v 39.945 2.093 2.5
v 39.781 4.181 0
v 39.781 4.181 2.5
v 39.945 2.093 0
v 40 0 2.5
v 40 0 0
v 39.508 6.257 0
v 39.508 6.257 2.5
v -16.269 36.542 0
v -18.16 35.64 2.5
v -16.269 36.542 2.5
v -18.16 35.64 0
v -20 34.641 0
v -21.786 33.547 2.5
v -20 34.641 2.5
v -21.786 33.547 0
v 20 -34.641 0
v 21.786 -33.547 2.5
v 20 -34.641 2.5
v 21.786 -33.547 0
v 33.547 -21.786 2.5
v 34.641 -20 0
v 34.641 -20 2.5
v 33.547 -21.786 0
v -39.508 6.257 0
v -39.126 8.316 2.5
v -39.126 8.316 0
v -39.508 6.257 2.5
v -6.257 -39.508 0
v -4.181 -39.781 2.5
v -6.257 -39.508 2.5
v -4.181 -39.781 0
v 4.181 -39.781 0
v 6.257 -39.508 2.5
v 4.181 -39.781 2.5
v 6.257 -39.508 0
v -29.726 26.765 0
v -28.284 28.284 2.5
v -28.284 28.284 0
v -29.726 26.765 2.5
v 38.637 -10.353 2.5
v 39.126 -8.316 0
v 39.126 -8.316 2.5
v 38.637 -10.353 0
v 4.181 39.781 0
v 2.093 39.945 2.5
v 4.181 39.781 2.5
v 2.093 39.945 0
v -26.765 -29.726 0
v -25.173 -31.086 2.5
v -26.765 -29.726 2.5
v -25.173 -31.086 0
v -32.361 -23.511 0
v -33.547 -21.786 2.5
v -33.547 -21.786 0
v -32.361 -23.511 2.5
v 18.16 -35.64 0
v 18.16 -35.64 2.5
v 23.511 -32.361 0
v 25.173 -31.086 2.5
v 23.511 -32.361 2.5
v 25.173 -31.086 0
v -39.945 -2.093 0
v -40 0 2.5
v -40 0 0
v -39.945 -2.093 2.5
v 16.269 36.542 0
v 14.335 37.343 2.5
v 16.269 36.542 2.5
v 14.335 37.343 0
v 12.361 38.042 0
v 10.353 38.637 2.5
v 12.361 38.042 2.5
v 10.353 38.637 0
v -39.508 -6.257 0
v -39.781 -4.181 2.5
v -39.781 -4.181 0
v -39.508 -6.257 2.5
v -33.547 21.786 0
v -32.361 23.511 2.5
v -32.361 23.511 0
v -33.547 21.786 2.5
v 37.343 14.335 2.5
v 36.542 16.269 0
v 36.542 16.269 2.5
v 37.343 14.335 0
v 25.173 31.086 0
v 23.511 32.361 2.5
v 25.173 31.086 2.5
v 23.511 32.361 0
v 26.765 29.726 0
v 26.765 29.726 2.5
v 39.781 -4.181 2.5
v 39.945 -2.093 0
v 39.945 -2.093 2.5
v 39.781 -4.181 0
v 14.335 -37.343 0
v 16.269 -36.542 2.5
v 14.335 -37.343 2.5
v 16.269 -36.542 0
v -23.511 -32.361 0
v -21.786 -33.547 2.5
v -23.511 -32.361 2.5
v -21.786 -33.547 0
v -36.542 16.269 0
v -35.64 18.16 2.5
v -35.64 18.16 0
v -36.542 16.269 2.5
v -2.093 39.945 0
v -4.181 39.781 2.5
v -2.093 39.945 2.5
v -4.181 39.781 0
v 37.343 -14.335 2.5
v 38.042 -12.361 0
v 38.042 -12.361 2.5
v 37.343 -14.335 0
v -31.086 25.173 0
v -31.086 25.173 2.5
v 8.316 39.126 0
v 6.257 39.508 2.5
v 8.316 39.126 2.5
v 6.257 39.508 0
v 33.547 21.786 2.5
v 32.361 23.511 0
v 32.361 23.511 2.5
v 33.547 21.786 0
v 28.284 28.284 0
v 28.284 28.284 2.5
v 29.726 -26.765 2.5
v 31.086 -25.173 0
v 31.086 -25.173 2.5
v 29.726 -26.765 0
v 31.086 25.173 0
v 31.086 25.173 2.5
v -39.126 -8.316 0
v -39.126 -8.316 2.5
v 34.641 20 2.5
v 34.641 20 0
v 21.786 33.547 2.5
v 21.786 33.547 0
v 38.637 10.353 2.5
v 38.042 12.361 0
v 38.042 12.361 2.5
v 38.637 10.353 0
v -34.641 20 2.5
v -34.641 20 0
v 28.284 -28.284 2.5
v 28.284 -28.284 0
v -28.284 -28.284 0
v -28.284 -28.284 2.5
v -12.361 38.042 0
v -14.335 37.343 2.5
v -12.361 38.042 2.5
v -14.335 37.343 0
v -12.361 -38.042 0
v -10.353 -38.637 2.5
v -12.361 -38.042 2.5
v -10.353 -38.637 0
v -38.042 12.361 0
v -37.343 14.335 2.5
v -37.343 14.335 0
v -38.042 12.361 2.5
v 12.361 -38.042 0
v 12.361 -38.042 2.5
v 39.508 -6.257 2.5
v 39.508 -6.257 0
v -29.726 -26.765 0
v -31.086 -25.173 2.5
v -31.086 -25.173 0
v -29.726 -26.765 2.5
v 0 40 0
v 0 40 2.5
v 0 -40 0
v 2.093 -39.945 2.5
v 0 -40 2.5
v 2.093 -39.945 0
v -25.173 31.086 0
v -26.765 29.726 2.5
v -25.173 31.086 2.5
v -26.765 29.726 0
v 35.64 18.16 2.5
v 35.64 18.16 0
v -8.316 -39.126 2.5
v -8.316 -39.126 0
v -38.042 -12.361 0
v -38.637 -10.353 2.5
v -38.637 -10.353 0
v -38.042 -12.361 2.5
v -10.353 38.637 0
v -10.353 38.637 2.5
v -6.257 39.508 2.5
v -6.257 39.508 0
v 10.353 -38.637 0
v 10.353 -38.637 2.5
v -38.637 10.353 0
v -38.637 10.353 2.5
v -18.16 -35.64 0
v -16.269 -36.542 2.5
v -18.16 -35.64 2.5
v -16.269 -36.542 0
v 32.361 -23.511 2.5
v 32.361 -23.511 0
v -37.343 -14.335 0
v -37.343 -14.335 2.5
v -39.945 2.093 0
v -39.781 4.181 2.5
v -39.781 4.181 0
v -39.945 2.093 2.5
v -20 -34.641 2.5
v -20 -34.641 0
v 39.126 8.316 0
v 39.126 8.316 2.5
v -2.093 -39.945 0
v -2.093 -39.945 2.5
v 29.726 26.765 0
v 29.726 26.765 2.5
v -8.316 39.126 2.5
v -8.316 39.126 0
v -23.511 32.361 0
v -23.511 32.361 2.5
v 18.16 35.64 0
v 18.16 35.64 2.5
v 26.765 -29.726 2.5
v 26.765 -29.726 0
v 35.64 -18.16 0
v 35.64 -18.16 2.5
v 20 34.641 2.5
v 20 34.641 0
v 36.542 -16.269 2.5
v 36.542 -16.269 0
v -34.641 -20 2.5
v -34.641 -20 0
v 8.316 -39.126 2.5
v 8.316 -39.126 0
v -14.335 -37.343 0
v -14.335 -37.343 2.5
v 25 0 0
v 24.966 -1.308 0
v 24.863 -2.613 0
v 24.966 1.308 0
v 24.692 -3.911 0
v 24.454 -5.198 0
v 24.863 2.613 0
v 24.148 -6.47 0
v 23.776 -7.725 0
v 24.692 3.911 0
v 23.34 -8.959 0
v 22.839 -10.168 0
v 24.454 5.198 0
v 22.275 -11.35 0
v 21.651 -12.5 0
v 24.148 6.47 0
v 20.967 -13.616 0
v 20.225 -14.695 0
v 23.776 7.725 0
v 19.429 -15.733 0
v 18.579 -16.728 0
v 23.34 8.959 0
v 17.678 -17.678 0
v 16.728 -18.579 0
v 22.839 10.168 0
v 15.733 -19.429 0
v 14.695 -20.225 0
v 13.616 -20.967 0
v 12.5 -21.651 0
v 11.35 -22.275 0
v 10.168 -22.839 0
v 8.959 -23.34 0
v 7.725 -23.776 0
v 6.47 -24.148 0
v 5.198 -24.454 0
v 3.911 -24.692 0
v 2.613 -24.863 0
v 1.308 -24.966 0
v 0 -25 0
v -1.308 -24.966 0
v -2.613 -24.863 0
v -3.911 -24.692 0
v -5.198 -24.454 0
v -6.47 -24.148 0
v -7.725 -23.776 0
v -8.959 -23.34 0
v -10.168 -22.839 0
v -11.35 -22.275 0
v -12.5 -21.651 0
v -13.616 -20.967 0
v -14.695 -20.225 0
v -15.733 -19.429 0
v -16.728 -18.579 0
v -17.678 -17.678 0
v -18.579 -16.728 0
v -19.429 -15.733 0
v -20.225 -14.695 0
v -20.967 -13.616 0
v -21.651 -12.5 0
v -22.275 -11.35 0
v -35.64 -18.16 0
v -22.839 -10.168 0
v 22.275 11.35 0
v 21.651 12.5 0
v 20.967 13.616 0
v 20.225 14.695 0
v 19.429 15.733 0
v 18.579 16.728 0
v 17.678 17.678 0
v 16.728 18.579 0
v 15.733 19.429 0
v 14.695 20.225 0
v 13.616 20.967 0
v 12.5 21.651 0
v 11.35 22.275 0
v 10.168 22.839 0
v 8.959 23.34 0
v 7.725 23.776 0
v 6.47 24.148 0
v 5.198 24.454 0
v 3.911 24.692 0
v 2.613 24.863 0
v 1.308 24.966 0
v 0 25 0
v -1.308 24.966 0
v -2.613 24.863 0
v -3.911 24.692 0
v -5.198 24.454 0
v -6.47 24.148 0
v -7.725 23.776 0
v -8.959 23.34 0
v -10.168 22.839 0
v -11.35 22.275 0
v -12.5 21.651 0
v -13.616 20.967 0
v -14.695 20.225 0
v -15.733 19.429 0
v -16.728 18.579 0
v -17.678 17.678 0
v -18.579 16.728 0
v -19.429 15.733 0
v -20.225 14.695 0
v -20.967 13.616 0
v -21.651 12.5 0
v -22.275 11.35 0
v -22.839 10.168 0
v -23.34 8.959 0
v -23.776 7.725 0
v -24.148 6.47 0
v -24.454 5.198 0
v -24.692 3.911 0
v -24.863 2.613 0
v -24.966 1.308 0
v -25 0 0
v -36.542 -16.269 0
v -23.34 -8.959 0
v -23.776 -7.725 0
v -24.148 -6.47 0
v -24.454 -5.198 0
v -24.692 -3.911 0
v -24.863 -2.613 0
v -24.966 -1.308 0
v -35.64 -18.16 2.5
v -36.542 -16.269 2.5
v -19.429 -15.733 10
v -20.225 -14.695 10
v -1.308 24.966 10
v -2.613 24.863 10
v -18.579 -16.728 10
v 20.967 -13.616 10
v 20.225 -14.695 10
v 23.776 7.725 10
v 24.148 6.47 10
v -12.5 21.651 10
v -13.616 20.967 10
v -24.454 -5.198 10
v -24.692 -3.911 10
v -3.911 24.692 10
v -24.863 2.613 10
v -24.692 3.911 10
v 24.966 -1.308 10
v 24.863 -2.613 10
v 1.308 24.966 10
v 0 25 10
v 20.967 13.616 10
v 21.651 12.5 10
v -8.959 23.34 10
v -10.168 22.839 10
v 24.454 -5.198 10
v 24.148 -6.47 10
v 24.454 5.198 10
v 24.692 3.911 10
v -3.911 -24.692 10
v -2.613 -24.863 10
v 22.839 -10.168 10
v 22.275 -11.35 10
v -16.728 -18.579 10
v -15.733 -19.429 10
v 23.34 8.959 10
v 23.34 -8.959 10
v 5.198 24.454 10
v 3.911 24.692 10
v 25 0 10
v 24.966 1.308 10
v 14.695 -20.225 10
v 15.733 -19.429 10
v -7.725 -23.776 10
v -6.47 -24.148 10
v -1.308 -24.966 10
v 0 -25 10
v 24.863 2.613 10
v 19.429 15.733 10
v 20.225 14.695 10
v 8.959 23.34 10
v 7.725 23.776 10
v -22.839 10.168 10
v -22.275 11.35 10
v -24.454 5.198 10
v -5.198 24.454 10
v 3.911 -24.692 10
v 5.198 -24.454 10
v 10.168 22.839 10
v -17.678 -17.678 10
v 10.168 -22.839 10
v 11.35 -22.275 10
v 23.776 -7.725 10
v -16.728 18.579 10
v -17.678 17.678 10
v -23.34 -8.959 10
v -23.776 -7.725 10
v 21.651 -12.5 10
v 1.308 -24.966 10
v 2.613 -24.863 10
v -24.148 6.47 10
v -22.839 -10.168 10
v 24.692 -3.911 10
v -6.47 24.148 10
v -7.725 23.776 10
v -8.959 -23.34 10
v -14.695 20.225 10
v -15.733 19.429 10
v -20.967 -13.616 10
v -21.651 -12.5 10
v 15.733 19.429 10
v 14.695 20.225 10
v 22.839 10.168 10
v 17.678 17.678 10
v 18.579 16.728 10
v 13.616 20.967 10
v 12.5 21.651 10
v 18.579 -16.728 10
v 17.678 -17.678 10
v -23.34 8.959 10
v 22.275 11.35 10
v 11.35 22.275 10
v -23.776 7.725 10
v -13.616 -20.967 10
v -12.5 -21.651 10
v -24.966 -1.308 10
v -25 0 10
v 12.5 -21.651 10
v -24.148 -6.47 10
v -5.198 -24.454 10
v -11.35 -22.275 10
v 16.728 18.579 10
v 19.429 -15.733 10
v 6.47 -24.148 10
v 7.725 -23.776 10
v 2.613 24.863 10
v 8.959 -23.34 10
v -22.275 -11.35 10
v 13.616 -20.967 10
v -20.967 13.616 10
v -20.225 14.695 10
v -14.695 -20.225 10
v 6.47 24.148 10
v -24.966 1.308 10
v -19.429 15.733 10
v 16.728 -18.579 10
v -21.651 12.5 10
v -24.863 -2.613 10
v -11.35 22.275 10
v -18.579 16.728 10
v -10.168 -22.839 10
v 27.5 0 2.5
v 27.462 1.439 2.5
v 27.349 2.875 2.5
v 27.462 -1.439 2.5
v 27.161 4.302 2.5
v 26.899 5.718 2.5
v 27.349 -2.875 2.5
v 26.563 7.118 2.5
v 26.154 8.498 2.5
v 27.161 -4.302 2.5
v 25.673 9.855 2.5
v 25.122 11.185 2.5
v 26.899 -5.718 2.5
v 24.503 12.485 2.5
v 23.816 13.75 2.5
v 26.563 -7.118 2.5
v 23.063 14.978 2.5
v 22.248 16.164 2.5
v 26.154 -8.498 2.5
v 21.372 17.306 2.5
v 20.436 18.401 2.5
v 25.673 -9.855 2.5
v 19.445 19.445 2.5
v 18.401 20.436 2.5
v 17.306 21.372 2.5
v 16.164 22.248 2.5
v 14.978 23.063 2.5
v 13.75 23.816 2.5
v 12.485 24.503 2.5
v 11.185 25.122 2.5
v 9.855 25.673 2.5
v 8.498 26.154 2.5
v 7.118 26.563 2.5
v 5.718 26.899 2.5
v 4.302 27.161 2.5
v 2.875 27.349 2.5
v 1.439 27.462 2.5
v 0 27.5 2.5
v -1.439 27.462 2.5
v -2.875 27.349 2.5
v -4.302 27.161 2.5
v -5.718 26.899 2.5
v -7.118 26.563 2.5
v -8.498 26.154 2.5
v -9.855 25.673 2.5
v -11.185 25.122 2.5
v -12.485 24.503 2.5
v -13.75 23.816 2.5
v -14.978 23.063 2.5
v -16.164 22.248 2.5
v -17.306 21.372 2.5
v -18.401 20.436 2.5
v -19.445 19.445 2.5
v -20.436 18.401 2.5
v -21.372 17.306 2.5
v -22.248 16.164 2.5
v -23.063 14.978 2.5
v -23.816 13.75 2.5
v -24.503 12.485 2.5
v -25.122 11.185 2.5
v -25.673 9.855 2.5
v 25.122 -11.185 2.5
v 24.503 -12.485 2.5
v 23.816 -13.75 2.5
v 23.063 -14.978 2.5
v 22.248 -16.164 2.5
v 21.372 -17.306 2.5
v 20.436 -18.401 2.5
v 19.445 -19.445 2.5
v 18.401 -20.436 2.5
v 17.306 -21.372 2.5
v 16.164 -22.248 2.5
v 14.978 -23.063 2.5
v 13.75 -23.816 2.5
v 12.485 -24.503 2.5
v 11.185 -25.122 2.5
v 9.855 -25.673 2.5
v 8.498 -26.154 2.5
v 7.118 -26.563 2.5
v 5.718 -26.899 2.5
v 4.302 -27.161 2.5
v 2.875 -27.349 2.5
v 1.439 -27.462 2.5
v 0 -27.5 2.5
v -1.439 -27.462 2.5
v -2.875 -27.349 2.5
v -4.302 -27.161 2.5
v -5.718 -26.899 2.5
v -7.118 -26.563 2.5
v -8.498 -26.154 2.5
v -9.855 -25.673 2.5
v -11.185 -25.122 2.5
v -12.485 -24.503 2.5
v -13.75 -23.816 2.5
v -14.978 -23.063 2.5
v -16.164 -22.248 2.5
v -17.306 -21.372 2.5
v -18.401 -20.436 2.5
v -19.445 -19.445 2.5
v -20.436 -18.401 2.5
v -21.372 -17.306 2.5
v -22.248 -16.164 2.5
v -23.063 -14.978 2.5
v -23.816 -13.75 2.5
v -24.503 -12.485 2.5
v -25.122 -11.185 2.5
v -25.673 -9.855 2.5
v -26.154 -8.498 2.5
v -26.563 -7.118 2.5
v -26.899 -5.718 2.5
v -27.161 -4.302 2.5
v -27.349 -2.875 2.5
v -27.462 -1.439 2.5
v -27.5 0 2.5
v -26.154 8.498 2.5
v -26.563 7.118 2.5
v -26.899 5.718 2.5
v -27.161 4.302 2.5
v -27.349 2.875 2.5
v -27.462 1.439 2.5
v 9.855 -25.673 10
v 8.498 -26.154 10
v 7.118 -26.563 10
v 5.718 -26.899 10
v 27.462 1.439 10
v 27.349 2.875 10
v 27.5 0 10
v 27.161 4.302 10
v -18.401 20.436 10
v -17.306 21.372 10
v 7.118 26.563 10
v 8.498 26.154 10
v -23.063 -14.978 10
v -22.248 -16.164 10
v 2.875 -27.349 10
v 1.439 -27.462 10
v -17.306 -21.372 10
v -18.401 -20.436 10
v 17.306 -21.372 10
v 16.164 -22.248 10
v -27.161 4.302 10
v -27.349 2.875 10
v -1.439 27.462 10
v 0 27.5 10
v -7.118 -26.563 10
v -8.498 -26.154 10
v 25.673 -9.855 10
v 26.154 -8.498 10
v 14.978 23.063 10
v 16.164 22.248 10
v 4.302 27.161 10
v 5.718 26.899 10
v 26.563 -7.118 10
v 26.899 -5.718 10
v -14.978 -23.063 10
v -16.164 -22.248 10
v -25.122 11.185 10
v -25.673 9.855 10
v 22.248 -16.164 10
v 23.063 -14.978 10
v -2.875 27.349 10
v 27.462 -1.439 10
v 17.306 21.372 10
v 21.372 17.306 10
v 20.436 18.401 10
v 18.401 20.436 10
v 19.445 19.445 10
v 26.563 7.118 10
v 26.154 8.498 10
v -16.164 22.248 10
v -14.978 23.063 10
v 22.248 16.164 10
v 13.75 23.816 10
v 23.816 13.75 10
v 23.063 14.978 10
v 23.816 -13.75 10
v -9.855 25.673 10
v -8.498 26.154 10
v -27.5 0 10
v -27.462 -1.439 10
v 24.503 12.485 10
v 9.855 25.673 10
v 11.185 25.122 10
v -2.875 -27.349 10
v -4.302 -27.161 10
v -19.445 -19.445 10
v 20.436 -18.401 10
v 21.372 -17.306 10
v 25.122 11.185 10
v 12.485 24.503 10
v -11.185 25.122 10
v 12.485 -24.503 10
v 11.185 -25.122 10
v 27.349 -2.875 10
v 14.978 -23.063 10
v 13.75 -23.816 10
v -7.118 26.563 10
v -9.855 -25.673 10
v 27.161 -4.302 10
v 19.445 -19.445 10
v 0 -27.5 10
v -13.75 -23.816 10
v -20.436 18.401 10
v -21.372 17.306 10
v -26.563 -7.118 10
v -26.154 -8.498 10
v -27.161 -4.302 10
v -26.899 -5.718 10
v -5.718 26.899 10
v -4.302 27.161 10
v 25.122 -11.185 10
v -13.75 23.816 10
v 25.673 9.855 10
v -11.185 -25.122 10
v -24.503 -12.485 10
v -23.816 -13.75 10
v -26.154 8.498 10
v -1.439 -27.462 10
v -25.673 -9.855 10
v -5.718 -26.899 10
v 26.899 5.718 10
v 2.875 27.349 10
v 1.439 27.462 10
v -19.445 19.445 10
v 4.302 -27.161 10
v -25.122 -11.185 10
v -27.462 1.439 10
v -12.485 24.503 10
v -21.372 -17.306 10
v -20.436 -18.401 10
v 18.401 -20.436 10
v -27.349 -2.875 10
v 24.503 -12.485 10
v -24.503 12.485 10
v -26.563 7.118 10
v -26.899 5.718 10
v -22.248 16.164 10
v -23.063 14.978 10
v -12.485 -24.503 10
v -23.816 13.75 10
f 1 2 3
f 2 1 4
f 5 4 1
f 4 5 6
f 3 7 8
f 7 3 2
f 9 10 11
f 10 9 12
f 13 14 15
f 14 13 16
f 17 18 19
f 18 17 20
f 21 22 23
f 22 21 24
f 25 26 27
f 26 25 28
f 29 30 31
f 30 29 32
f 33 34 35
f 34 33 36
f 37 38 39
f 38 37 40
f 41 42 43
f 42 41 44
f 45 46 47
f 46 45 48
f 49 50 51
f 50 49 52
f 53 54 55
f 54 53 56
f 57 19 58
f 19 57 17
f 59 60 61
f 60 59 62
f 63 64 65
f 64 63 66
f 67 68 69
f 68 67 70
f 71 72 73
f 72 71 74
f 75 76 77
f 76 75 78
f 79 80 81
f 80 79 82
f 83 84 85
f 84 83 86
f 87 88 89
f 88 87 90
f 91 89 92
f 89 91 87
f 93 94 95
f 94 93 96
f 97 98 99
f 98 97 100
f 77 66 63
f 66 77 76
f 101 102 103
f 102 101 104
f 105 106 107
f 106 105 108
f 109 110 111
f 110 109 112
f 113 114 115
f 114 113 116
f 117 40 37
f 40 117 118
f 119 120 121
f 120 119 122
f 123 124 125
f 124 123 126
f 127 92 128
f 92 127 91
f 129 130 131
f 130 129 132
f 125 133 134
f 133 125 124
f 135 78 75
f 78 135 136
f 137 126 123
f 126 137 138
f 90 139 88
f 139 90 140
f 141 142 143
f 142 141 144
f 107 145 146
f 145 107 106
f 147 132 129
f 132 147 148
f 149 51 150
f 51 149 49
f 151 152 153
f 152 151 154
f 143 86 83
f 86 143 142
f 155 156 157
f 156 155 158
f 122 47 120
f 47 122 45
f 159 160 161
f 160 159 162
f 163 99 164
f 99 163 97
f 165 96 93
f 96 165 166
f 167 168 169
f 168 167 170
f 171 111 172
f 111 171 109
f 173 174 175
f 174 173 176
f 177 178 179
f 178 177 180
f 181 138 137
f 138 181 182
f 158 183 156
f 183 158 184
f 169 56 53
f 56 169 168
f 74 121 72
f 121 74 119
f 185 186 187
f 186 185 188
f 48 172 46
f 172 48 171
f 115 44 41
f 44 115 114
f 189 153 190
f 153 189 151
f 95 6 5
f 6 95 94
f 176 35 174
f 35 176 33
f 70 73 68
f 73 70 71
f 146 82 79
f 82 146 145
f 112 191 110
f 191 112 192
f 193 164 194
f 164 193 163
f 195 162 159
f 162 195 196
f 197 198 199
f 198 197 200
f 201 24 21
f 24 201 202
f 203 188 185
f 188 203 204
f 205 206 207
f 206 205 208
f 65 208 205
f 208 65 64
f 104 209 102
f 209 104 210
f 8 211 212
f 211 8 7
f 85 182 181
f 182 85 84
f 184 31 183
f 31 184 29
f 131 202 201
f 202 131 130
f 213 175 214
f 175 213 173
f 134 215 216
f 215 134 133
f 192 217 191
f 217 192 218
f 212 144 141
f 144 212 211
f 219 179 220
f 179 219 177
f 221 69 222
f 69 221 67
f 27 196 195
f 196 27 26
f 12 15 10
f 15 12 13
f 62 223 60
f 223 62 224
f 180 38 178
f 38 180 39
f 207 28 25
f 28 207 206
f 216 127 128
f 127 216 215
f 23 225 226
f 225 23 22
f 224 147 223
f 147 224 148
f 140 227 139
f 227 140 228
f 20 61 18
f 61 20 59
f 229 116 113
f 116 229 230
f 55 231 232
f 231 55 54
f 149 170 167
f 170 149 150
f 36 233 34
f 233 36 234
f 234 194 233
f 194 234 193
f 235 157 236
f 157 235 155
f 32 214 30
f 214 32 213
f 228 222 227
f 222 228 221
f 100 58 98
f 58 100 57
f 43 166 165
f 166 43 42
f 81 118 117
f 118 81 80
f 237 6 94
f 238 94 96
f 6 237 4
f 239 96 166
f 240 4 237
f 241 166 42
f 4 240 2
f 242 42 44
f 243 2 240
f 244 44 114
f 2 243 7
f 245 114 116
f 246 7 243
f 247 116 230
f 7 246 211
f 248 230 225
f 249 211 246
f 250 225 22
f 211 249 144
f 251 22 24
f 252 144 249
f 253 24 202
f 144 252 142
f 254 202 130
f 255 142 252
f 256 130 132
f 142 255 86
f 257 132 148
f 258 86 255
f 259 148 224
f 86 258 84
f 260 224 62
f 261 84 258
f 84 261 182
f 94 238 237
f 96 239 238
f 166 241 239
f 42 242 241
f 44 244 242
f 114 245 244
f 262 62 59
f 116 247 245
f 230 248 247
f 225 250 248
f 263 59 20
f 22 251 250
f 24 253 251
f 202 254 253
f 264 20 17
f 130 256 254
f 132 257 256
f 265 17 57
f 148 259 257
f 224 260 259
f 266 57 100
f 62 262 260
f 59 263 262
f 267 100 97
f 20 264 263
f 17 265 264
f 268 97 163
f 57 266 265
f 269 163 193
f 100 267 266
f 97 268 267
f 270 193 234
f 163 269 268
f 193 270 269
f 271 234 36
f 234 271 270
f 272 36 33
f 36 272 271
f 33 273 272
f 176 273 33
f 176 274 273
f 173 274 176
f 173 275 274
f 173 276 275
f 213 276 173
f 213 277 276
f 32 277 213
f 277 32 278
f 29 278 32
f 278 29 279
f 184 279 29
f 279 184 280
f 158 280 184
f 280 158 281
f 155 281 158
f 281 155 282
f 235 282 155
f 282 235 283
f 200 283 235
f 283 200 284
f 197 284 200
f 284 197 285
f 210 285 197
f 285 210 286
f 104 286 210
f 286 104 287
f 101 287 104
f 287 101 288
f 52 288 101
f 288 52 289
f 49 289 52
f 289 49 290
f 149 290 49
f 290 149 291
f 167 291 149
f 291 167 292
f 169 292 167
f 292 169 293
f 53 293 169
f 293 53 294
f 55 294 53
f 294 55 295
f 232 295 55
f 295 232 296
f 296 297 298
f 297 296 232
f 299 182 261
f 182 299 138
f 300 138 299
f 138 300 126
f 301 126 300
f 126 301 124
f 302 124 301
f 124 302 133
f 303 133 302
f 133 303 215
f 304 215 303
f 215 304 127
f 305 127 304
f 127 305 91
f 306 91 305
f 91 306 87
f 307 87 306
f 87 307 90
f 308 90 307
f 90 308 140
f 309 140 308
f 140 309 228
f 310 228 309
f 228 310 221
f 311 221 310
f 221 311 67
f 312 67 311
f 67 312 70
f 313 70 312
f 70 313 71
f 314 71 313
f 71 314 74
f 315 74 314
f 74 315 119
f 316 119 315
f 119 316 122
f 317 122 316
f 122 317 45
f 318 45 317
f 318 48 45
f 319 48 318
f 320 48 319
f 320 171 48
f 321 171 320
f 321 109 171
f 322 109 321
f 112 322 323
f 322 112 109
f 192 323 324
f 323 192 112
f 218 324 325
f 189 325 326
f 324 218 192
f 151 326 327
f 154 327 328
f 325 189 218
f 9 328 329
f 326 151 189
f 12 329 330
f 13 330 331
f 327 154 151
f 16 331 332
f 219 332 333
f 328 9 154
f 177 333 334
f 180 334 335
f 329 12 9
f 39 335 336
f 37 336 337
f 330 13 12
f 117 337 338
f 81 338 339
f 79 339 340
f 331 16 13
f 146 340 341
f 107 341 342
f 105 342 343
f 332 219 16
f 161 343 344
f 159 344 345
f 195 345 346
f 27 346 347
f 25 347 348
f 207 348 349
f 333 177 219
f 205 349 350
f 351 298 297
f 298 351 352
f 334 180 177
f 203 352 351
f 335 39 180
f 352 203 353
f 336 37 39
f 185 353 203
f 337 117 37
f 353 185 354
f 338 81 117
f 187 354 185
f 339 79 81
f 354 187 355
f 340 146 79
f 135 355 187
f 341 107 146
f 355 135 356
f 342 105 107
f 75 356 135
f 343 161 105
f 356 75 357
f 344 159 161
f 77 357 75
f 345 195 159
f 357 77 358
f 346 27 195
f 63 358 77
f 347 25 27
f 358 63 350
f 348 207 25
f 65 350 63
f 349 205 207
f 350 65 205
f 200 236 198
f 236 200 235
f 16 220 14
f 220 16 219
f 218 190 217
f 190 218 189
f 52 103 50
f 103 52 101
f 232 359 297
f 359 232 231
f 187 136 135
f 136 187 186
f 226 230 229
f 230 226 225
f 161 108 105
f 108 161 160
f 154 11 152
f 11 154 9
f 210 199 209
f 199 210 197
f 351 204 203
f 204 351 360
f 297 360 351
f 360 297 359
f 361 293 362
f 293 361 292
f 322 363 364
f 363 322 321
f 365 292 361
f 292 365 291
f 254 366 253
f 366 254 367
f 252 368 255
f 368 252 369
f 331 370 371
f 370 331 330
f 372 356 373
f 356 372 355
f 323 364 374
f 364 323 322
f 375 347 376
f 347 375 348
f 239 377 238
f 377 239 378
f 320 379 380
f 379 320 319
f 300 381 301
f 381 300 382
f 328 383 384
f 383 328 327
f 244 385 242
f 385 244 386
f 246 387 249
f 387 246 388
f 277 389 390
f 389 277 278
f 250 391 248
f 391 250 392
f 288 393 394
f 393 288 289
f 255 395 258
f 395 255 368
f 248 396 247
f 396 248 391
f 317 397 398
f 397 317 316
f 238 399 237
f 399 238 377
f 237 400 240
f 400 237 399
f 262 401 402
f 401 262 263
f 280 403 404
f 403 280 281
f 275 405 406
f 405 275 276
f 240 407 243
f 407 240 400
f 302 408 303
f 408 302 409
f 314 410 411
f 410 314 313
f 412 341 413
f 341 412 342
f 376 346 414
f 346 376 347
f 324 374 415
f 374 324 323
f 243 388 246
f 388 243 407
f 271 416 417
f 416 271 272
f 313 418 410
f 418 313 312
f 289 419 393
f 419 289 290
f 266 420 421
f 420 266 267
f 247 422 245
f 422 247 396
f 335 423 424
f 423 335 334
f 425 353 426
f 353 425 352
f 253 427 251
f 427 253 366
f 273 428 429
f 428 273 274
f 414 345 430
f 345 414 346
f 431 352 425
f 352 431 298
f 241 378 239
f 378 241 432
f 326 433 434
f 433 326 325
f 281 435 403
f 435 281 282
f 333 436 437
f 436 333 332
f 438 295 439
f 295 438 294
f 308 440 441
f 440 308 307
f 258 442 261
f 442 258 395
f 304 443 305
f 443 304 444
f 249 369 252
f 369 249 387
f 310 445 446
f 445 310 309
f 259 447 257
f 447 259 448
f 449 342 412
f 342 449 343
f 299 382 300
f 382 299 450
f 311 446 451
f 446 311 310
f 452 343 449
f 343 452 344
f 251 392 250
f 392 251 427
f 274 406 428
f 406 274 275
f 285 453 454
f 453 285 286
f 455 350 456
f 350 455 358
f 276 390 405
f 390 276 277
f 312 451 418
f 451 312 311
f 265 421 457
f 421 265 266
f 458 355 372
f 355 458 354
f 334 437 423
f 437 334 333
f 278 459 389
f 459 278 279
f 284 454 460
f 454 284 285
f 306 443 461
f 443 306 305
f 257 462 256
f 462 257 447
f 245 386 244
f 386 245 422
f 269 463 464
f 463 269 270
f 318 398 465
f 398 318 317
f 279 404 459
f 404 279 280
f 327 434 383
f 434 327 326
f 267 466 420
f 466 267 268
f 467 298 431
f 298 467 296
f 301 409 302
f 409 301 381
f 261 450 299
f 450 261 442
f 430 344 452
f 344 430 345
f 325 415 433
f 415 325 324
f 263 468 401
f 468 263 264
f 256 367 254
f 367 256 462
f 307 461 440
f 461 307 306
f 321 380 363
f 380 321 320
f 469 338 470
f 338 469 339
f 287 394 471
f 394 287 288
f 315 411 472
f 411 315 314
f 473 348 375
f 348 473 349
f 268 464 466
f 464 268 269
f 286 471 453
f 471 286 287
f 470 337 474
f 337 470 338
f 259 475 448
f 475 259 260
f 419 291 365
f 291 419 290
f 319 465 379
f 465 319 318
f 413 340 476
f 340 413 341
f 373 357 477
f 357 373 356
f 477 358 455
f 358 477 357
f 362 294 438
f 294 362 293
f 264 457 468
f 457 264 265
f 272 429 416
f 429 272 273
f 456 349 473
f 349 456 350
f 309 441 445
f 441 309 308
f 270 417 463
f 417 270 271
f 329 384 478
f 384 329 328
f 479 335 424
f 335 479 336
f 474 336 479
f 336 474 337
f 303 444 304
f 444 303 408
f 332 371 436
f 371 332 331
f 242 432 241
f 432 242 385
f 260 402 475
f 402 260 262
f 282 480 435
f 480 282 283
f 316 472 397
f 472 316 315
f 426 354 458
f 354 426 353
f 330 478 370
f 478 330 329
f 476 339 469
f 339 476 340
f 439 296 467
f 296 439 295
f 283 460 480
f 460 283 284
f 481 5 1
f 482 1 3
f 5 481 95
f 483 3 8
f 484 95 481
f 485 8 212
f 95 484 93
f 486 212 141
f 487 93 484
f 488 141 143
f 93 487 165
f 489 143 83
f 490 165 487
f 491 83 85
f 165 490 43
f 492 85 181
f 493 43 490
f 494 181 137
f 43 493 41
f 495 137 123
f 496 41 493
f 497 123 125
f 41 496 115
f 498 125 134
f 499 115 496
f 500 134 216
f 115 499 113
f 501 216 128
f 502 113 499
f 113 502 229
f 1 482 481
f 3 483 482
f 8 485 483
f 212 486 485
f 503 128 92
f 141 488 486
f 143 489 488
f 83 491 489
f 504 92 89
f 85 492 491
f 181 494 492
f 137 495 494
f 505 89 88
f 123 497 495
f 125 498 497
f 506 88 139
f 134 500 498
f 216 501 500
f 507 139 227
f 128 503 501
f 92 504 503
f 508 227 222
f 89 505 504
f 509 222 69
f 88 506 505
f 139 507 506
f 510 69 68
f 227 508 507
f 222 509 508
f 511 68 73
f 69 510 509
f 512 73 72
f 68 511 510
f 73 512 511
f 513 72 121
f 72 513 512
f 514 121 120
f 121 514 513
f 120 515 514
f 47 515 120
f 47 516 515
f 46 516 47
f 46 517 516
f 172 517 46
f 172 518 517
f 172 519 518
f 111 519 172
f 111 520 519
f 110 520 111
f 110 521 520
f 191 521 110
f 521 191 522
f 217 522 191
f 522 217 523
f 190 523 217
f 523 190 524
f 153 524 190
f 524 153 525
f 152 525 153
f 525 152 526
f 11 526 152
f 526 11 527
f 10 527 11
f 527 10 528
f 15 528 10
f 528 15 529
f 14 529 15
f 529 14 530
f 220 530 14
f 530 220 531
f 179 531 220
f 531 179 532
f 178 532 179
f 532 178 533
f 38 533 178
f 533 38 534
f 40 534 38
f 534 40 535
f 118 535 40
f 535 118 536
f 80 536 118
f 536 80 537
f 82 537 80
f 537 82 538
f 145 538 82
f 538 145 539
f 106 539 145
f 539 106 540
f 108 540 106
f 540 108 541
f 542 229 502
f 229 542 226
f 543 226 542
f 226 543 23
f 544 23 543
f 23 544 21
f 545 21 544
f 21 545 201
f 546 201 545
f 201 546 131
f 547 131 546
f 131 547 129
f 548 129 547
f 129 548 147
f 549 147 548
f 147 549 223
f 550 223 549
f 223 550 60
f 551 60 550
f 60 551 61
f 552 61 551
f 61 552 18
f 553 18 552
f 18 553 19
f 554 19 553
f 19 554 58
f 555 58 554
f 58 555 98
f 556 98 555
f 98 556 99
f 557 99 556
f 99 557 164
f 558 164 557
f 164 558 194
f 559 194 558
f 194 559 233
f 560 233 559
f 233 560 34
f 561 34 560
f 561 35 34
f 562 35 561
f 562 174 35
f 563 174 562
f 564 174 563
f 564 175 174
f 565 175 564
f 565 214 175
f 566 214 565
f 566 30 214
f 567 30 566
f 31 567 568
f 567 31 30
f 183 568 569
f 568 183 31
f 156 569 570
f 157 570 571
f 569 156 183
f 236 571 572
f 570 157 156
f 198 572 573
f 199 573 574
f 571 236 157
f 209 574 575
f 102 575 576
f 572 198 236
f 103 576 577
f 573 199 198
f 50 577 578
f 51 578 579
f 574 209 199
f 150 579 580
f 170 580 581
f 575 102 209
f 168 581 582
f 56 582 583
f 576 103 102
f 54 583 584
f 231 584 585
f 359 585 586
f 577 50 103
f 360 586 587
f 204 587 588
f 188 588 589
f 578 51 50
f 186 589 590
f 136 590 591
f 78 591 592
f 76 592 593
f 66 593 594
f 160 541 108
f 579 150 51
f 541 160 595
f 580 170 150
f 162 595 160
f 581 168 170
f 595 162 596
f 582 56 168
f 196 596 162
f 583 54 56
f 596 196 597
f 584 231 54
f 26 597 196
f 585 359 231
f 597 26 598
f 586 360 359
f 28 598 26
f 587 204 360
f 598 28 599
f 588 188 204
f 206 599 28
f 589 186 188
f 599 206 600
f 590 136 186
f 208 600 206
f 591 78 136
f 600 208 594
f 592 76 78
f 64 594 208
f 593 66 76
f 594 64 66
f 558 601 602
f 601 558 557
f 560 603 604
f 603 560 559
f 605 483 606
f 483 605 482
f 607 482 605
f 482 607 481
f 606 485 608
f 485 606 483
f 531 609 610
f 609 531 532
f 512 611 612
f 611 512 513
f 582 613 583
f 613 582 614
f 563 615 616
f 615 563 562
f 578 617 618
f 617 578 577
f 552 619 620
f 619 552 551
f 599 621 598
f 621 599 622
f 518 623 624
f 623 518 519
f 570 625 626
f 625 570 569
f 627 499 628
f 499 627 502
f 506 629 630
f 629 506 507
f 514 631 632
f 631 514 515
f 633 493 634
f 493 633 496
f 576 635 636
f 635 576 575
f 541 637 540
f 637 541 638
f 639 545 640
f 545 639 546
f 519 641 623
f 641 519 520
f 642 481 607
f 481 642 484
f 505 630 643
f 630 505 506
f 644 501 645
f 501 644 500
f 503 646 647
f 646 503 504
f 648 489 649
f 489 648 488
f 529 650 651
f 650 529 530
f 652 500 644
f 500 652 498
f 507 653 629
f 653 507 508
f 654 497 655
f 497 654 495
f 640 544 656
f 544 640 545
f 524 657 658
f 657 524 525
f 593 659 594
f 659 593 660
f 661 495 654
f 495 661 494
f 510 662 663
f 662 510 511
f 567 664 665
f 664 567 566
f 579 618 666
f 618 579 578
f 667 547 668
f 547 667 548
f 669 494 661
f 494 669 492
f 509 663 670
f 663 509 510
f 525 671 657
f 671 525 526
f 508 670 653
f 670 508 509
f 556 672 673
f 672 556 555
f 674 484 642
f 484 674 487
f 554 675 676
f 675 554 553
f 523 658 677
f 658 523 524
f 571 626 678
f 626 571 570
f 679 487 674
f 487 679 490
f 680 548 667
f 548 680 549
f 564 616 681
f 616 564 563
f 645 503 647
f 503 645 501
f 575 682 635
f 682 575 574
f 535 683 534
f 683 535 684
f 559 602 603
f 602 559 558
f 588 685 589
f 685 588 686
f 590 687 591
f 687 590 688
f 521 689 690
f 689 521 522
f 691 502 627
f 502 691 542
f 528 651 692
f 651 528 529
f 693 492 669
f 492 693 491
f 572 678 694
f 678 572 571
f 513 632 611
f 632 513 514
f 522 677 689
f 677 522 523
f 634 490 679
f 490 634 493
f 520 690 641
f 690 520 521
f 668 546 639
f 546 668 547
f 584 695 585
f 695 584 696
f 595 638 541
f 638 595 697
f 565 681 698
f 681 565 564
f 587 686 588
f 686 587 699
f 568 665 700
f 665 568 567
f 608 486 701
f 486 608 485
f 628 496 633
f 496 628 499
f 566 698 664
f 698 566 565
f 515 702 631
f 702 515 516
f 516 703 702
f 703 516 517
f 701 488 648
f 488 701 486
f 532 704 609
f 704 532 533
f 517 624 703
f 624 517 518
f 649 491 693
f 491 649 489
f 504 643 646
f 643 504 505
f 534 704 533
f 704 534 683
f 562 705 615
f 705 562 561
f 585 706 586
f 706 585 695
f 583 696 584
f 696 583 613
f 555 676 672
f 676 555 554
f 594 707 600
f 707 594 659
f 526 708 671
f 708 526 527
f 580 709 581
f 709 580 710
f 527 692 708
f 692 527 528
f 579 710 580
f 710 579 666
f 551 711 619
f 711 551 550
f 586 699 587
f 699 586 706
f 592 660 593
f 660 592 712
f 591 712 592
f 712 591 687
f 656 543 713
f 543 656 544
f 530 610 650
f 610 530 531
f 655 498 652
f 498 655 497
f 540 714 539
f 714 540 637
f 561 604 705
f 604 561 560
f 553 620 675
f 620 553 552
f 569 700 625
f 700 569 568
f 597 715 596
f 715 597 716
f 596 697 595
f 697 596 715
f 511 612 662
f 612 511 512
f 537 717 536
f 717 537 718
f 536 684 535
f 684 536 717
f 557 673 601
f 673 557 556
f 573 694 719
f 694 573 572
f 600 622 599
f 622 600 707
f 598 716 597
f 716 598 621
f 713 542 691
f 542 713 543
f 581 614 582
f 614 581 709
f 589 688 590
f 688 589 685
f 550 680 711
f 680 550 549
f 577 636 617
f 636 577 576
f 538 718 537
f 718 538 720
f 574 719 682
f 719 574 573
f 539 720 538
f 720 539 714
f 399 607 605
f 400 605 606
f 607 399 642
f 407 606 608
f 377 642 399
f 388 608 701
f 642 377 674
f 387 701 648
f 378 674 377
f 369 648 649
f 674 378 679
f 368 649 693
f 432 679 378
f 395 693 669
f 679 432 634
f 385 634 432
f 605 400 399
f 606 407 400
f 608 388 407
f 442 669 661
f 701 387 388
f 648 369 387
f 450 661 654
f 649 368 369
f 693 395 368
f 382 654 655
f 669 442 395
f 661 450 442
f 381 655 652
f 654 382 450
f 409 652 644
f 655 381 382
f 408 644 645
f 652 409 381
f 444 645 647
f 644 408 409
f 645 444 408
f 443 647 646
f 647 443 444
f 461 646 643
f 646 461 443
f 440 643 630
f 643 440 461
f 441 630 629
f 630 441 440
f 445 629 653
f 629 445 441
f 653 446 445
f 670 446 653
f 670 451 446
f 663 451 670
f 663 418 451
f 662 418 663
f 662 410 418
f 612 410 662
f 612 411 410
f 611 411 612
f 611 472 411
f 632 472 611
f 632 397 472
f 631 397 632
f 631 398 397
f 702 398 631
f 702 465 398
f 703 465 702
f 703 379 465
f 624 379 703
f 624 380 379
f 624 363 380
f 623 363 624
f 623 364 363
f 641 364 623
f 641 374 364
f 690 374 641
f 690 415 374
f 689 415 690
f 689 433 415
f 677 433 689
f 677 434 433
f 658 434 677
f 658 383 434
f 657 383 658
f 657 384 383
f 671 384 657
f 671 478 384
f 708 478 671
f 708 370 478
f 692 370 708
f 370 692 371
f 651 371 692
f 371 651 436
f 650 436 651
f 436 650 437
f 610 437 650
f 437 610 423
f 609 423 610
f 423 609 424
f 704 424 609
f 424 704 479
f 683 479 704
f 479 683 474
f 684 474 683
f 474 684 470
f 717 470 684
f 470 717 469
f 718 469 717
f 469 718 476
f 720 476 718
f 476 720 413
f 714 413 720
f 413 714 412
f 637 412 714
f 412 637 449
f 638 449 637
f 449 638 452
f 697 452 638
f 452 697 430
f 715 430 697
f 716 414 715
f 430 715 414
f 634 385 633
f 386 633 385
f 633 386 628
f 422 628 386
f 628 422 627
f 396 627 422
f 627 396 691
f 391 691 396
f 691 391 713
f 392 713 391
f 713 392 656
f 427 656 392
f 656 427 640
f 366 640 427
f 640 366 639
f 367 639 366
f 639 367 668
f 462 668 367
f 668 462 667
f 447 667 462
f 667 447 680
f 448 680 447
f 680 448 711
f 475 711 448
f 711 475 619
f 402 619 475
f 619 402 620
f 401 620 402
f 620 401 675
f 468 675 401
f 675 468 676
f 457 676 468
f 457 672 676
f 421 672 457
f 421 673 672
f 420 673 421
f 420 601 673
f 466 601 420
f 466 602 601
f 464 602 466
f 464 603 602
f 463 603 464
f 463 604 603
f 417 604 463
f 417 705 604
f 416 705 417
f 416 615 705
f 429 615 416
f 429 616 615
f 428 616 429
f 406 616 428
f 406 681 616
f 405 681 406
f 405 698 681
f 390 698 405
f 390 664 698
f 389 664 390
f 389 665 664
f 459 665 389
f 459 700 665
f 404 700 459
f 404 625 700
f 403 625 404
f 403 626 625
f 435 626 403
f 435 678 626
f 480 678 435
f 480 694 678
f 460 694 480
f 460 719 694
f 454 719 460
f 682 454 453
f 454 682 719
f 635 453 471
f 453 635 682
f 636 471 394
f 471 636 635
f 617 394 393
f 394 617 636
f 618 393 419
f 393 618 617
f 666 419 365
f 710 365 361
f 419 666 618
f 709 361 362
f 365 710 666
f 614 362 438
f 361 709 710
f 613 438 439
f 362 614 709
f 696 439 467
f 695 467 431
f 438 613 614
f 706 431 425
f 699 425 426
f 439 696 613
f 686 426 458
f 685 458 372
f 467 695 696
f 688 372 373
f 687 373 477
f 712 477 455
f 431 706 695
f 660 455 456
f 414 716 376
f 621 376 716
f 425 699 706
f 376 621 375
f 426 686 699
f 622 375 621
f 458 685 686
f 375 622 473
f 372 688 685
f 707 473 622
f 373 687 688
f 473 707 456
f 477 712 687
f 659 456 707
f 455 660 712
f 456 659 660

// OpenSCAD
// store cable without bending it
// 13.09.2025 Sebastian Weigl

$fn=120;

difference() {
  difference() {
    cylinder(d=80,h=20);
    cylinder(d=50,h=20);
  }

  translate([0,0,2.5])
  difference() {
    cylinder(d=80,h=15);
    cylinder(d=55,h=15);
  }
translate([0,0,10])
cylinder(d=80,h=10);
}
